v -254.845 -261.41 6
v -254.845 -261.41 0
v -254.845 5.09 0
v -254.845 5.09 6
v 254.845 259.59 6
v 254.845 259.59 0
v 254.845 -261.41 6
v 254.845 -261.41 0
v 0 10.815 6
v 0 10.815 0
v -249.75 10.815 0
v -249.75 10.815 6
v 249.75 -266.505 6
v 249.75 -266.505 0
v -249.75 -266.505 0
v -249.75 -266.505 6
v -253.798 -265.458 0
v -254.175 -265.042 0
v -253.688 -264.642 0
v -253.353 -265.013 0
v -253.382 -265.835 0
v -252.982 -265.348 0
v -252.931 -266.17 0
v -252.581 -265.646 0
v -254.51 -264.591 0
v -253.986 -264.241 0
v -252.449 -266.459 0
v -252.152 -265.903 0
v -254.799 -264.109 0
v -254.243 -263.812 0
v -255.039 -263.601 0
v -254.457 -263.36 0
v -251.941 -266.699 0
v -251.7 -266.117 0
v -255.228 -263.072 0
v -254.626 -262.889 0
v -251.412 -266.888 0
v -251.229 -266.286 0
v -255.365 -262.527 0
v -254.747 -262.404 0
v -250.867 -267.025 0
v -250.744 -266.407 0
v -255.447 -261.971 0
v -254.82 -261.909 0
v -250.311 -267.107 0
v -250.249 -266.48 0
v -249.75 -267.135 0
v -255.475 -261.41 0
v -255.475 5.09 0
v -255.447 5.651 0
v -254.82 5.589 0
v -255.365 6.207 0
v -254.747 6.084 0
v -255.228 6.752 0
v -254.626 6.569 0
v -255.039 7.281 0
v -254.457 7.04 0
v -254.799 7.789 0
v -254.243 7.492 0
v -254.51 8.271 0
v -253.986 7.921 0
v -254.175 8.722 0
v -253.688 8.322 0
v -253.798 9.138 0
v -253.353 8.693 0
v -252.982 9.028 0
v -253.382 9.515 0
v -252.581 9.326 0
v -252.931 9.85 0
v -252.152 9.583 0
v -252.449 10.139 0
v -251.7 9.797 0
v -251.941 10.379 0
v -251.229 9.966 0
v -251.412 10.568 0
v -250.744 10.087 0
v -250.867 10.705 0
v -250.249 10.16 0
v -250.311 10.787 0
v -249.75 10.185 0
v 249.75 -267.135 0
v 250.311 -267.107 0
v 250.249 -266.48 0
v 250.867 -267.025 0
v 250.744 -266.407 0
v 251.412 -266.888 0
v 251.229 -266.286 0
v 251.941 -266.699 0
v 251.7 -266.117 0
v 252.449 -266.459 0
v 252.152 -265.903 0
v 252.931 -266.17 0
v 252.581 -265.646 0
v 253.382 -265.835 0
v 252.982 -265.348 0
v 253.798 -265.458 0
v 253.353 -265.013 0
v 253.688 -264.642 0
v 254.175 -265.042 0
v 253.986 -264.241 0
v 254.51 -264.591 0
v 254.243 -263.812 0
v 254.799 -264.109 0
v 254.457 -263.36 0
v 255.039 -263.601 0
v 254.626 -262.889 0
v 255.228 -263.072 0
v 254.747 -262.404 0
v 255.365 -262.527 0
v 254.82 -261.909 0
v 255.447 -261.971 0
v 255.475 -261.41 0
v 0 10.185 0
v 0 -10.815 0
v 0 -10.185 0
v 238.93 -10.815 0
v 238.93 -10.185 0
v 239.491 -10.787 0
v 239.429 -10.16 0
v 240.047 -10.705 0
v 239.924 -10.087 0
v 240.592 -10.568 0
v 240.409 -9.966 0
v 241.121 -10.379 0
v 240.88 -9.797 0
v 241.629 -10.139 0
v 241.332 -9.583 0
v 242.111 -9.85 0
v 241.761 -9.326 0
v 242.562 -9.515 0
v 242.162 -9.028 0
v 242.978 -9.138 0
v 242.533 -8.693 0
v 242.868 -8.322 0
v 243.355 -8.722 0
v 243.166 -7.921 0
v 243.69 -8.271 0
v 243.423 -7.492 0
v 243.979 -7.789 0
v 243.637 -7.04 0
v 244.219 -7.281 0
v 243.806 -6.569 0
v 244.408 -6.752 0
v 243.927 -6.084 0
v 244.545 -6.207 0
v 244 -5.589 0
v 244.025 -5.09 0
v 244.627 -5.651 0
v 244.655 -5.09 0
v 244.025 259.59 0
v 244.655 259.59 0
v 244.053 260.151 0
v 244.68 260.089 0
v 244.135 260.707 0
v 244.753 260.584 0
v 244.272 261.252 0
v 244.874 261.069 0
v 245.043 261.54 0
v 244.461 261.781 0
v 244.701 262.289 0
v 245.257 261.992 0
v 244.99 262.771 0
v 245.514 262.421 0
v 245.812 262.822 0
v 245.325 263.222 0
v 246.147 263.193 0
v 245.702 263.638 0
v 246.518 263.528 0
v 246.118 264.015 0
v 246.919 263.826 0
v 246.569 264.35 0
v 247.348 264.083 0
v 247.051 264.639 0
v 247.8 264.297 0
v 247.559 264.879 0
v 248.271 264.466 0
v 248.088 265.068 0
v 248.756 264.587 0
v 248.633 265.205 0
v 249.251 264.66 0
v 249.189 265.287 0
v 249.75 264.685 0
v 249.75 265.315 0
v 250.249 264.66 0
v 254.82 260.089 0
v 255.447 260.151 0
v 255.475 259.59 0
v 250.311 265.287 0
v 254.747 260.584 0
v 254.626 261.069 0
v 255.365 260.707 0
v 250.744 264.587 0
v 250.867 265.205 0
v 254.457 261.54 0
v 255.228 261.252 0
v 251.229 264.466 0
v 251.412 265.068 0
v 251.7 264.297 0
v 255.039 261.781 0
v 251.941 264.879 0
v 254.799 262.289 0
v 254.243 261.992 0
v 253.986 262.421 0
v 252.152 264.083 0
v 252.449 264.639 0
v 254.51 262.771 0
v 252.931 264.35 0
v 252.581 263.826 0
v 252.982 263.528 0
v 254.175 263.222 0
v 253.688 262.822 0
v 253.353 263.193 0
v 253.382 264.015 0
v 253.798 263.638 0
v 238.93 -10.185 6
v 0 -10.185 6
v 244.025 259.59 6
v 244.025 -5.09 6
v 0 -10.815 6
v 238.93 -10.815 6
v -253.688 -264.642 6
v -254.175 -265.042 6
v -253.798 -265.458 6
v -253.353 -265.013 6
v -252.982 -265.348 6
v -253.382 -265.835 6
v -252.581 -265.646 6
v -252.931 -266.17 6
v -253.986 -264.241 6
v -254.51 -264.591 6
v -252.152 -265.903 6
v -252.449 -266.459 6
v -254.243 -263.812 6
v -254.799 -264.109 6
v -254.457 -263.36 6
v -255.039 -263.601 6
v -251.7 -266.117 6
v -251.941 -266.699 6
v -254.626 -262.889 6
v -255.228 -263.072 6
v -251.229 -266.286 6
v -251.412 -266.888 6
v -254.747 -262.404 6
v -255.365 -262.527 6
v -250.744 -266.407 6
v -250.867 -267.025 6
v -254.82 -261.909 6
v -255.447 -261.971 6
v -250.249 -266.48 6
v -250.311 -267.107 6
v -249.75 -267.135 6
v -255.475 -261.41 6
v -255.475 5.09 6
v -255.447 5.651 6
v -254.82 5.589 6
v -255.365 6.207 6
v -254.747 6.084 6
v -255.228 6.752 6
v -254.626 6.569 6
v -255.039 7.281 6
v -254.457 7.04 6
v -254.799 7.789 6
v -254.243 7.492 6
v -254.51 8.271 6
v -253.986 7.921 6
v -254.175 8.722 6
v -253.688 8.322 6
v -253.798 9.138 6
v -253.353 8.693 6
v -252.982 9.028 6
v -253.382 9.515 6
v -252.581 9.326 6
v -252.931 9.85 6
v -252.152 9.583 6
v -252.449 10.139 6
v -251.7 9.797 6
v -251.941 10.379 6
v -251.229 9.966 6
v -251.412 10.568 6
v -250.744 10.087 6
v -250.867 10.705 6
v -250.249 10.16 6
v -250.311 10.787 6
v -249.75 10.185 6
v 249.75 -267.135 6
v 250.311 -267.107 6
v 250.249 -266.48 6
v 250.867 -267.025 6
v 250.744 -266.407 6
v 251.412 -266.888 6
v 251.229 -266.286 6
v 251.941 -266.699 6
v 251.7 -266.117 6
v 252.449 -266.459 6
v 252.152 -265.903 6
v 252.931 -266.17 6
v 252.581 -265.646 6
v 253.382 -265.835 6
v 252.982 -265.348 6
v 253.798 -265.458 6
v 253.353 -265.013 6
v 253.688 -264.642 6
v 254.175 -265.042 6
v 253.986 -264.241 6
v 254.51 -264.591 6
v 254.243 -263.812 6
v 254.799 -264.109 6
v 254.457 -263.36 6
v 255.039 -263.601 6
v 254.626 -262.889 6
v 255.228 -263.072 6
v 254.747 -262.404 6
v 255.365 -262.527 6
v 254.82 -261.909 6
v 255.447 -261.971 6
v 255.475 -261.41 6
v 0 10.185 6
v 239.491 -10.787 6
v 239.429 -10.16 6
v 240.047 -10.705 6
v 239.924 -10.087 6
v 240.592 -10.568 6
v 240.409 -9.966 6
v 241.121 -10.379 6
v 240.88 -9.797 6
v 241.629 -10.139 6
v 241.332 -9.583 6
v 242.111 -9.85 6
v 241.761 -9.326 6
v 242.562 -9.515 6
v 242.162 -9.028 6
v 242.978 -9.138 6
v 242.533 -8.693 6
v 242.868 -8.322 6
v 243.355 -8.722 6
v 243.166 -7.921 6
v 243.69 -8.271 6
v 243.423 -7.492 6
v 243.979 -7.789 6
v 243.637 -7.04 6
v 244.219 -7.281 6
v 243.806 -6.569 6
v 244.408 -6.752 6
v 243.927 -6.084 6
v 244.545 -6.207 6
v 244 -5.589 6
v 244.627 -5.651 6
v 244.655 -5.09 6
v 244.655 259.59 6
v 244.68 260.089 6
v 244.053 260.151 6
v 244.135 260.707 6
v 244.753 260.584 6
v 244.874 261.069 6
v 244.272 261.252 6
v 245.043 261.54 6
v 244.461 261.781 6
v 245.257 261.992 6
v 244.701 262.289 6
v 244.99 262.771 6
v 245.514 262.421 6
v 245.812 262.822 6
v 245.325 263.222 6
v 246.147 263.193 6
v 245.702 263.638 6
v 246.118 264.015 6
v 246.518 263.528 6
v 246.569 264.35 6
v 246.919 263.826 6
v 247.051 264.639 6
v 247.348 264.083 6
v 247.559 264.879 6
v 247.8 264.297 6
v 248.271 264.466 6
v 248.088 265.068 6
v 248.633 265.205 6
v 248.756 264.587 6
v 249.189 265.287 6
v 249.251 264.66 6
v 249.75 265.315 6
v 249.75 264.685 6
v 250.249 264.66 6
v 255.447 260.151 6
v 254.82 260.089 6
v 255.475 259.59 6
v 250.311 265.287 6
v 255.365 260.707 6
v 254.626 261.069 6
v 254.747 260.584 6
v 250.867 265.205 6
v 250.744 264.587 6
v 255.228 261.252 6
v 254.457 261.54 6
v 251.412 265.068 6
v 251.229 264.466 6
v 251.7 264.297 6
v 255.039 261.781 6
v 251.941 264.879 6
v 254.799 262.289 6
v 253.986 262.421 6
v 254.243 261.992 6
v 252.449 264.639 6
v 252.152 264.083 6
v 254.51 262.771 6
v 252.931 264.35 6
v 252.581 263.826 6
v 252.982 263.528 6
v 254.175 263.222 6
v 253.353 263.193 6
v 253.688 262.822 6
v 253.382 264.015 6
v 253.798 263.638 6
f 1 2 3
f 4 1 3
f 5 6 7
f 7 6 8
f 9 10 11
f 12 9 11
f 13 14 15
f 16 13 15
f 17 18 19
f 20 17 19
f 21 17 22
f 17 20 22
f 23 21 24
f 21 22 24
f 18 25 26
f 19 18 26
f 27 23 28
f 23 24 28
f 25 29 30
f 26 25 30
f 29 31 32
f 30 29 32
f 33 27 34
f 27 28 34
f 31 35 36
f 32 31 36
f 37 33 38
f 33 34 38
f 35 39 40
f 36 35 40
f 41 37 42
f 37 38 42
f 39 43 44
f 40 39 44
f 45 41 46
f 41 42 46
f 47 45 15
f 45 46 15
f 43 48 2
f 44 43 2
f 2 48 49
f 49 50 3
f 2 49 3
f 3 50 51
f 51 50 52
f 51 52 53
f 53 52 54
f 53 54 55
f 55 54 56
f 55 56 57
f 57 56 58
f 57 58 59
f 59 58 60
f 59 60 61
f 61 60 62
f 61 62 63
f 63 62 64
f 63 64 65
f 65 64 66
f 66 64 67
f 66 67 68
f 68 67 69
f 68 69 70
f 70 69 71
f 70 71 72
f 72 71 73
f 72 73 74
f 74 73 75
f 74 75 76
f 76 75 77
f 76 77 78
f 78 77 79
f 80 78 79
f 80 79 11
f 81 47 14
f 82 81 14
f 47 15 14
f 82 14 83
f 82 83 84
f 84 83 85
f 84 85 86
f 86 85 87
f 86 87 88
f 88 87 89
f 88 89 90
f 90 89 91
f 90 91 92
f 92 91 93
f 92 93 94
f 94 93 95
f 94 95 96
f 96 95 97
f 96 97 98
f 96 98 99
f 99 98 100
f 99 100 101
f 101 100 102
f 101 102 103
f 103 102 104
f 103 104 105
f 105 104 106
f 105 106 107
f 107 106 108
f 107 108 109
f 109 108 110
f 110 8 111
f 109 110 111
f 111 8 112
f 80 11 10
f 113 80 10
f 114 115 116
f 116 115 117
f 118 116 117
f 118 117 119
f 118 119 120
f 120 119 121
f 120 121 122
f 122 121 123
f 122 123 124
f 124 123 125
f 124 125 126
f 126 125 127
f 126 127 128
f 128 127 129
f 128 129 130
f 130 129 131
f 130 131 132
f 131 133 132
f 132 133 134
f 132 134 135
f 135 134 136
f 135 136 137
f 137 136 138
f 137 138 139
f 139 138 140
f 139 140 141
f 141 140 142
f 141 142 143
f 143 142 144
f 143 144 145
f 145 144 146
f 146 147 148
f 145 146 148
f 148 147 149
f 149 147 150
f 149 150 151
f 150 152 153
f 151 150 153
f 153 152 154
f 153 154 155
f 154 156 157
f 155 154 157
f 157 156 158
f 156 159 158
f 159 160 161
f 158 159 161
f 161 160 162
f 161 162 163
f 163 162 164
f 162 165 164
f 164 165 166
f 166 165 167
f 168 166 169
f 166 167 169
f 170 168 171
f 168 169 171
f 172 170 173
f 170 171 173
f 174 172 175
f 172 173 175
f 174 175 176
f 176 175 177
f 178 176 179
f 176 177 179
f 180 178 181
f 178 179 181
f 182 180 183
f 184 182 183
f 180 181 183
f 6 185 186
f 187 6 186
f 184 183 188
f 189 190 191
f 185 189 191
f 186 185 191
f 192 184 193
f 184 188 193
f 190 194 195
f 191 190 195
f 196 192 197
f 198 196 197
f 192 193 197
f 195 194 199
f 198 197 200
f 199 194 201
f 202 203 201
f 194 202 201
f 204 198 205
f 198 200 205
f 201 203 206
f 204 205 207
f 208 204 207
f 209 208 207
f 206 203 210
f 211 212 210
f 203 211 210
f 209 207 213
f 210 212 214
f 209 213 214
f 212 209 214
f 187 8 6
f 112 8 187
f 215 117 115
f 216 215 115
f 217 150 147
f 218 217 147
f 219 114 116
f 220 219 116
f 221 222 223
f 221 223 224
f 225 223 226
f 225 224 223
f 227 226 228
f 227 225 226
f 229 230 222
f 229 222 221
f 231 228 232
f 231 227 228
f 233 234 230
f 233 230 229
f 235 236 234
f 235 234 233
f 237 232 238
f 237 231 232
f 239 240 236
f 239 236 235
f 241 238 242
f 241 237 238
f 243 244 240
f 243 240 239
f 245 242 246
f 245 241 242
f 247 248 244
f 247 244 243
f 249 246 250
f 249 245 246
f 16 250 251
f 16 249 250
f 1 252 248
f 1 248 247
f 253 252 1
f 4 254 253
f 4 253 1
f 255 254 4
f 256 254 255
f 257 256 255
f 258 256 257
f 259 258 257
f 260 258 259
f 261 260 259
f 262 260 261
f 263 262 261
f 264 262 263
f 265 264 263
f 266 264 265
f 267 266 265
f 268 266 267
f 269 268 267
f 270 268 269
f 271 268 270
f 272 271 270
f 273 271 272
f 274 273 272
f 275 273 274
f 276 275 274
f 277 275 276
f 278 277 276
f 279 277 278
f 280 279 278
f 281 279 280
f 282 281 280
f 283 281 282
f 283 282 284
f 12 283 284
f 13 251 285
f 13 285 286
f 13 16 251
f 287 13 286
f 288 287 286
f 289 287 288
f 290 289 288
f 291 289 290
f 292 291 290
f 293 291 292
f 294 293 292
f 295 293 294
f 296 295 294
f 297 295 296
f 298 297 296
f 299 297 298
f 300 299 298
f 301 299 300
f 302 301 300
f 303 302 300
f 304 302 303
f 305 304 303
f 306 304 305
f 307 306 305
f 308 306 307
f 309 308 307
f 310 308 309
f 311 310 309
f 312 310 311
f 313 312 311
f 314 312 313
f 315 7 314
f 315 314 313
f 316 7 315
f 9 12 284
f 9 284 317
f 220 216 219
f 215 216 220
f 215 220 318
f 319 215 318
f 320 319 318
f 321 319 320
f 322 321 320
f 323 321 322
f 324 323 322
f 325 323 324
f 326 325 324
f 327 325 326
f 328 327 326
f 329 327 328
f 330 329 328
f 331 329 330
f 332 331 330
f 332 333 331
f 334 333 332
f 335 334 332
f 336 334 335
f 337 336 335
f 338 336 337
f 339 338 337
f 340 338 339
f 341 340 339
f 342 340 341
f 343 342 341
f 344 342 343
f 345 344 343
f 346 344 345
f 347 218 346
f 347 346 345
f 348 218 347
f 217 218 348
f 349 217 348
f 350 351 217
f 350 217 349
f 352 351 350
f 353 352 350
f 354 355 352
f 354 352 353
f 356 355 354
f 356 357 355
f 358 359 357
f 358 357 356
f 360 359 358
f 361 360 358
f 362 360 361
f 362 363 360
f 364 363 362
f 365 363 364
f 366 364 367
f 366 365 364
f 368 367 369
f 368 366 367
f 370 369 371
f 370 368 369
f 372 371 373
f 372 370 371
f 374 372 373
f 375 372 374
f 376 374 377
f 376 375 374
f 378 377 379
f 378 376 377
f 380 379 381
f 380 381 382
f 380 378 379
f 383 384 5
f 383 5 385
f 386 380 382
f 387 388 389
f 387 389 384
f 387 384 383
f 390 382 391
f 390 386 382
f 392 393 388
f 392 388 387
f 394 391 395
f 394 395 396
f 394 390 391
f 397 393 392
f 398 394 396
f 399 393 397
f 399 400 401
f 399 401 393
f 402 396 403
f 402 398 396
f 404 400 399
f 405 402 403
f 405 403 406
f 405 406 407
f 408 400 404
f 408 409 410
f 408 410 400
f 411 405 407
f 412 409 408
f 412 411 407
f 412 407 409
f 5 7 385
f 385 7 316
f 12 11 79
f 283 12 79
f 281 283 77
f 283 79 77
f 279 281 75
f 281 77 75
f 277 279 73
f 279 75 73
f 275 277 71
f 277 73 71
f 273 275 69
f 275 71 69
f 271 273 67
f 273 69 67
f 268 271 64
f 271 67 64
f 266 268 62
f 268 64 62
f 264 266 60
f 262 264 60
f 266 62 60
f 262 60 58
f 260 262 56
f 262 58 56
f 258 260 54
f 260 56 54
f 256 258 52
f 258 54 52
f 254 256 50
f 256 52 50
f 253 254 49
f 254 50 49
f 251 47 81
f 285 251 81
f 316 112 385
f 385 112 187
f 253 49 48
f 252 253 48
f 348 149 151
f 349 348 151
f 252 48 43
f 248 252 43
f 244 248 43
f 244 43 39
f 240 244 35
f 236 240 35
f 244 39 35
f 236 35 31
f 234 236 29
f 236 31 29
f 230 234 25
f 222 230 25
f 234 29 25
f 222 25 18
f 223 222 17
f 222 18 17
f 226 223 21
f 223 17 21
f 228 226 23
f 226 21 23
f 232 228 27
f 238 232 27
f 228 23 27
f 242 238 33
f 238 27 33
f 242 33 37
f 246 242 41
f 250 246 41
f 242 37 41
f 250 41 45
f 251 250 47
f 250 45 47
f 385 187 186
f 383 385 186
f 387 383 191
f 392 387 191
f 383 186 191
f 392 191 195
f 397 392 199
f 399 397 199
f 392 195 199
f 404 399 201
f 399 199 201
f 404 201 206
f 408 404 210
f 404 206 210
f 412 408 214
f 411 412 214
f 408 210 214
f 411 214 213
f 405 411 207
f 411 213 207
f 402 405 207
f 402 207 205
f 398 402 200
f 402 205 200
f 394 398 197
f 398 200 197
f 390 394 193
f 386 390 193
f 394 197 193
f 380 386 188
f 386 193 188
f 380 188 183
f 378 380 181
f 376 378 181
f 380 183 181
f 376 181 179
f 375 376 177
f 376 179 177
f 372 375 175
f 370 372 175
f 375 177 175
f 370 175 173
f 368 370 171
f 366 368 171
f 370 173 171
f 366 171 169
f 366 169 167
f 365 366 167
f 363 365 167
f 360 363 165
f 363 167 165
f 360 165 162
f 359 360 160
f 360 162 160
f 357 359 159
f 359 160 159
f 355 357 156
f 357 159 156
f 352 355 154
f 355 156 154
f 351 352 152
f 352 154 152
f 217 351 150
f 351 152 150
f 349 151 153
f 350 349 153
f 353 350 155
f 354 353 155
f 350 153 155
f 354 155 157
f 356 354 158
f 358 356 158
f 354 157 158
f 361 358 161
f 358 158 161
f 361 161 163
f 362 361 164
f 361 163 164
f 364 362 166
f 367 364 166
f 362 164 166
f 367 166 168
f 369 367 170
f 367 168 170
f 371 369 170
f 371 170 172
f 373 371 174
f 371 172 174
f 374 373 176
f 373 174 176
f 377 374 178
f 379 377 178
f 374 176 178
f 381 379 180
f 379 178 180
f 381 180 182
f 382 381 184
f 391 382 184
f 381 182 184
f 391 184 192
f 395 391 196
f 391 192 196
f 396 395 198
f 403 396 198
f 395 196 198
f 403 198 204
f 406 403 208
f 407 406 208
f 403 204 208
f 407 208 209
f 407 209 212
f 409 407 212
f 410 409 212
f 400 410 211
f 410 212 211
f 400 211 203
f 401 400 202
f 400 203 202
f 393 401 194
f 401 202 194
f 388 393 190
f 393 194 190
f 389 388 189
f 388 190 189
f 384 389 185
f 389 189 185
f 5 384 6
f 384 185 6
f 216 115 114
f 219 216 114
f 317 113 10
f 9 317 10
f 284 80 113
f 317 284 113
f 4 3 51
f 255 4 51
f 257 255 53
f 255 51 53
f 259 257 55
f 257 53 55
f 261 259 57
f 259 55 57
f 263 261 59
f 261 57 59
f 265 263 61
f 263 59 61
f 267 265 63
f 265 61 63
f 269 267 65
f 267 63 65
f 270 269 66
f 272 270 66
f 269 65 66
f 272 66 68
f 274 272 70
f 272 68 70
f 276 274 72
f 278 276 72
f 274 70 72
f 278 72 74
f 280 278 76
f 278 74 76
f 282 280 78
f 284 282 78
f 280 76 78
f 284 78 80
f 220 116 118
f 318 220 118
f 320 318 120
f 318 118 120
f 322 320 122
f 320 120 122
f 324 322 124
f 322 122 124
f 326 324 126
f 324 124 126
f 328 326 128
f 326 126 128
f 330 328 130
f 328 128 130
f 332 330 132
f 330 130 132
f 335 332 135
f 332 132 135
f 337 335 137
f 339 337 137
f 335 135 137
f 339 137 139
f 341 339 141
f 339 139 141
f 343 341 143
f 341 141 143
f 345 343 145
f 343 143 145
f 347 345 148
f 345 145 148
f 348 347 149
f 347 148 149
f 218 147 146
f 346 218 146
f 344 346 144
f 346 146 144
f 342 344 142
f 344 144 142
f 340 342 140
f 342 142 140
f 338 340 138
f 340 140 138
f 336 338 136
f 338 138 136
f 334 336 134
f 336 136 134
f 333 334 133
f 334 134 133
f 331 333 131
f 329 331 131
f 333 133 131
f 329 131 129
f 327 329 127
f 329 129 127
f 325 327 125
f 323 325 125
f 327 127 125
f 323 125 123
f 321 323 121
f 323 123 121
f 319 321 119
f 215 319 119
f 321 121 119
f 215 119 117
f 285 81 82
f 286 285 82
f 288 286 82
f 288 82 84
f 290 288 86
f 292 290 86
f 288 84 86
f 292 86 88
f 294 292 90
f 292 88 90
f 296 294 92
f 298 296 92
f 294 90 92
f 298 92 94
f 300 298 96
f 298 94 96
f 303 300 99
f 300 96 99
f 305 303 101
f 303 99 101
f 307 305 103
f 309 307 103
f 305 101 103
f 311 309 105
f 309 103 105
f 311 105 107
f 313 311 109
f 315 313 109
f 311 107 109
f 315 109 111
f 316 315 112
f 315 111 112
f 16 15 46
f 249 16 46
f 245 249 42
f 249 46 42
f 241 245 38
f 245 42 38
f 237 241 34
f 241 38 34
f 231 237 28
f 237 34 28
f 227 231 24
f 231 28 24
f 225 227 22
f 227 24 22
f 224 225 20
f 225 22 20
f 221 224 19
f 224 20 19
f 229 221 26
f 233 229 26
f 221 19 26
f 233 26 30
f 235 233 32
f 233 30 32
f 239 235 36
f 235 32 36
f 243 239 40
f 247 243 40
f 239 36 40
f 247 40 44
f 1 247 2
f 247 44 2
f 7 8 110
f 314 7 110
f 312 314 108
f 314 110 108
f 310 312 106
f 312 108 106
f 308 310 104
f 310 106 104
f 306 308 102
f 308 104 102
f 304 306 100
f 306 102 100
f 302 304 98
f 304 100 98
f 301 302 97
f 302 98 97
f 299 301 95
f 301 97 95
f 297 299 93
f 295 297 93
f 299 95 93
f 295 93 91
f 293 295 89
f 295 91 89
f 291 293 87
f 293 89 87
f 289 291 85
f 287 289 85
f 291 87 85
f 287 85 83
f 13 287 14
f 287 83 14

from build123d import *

# Parameters (mm, degrees)
F1_DEPTH = 6


with BuildPart() as f1:
    # F0 (on Top) → F1 (new body)
    with BuildSketch(Plane.XY):
        with BuildLine():
            ThreePointArc((244.655, 259.59), (249.75, 264.685), (254.845, 259.59))
            Line((254.845, 259.59), (254.845, -261.41))
            ThreePointArc((254.845, -261.41), (253.352709, -265.012709), (249.75, -266.505))
            Line((249.75, -266.505), (-249.75, -266.505))
            ThreePointArc((-249.75, -266.505), (-253.352709, -265.012709), (-254.845, -261.41))
            Line((-254.845, -261.41), (-254.845, 5.09))
            Line((-254.845, 5.09), (-255.475, 5.09))
            Line((-255.475, 5.09), (-255.475, -261.41))
            ThreePointArc((-255.475, -261.41), (-253.798186, -265.458186), (-249.75, -267.135))
            Line((-249.75, -267.135), (249.75, -267.135))
            ThreePointArc((249.75, -267.135), (253.798186, -265.458186), (255.475, -261.41))
            Line((255.475, -261.41), (255.475, 259.59))
            ThreePointArc((255.475, 259.59), (249.75, 265.315), (244.025, 259.59))
            Line((244.025, 259.59), (244.025, -5.09))
            ThreePointArc((244.025, -5.09), (242.532709, -8.692709), (238.93, -10.185))
            Line((238.93, -10.185), (0, -10.185))
            Line((0, -10.185), (0, -10.815))
            Line((0, -10.815), (238.93, -10.815))
            ThreePointArc((238.93, -10.815), (242.978186, -9.138186), (244.655, -5.09))
            Line((244.655, -5.09), (244.655, 259.59))
        make_face()
        with BuildLine():
            Line((-255.475, 5.09), (-254.845, 5.09))
            ThreePointArc((-254.845, 5.09), (-253.352709, 8.692709), (-249.75, 10.185))
            Line((-249.75, 10.185), (0, 10.185))
            Line((0, 10.185), (0, 10.815))
            Line((0, 10.815), (-249.75, 10.815))
            ThreePointArc((-249.75, 10.815), (-253.798186, 9.138186), (-255.475, 5.09))
        make_face()
    extrude(amount=F1_DEPTH)


solid = f1.part
